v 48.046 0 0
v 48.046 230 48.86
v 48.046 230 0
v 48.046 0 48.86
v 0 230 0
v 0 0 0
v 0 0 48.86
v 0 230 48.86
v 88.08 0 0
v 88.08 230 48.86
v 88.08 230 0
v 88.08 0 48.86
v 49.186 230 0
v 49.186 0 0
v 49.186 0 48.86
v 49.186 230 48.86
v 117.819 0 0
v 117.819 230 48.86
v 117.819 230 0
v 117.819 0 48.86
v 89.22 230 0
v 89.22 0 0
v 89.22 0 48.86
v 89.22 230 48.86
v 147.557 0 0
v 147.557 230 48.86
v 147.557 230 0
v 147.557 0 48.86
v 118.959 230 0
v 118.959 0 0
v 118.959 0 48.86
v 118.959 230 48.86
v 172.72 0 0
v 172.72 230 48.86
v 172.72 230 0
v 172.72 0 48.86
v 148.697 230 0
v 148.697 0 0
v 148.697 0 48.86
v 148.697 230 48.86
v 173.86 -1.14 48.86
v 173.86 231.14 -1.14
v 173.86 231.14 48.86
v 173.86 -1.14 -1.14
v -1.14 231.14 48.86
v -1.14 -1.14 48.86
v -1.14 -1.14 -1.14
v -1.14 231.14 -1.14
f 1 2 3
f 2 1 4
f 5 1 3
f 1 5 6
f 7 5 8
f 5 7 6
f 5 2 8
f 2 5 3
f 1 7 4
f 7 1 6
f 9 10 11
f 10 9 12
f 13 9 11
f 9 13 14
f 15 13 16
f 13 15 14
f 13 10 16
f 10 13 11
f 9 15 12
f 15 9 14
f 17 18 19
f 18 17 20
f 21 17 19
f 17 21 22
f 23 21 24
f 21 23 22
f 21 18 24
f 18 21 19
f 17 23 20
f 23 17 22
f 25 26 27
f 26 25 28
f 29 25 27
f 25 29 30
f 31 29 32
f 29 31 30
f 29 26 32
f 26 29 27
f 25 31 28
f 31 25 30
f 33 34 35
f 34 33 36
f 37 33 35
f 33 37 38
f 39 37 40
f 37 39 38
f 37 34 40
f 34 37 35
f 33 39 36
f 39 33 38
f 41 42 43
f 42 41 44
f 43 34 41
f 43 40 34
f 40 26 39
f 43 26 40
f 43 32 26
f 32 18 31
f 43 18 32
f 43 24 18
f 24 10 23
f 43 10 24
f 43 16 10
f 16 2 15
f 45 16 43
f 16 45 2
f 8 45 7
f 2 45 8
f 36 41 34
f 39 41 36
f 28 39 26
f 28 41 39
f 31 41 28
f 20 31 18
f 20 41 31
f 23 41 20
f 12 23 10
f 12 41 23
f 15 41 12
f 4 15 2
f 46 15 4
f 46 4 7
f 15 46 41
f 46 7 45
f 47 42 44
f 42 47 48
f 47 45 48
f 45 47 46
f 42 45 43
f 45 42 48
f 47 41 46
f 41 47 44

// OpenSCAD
$fa =.01;
$fs = 1;

width = 175;
length=230;
height=50;
widths = [42, 34, 25, 25, 21];
twt=1.14;
function sum(x) = x * [for(i=[1:len(x)]) 1];
function cumsum(values, zero) = [for (a = 0, b = values[0]; a < len(values); a = a + 1, b = b + (values[a] == undef?zero:values[a])) b];

max_sum_widths = width - twt * (len(widths) + 1);


if(sum(widths) > max_sum_widths){
    color("red") text("error", size=100);
} else {
    widened_widths = [for(x = widths) x * max_sum_widths/sum(widths)];

    cum_widths = cumsum(widened_widths, 0);

    offsets = [for ( i = [0:len(cum_widths)-1]) cum_widths[i] - widened_widths[i] + i * twt];
    difference(){
        translate([-twt,-twt,-twt]) cube([width, length + 2*twt, height]);
        for(i = [0:len(widened_widths)-1]){
            translate([offsets[i],0,0]) cube([widened_widths[i],length,height]);
        }
    }
}
